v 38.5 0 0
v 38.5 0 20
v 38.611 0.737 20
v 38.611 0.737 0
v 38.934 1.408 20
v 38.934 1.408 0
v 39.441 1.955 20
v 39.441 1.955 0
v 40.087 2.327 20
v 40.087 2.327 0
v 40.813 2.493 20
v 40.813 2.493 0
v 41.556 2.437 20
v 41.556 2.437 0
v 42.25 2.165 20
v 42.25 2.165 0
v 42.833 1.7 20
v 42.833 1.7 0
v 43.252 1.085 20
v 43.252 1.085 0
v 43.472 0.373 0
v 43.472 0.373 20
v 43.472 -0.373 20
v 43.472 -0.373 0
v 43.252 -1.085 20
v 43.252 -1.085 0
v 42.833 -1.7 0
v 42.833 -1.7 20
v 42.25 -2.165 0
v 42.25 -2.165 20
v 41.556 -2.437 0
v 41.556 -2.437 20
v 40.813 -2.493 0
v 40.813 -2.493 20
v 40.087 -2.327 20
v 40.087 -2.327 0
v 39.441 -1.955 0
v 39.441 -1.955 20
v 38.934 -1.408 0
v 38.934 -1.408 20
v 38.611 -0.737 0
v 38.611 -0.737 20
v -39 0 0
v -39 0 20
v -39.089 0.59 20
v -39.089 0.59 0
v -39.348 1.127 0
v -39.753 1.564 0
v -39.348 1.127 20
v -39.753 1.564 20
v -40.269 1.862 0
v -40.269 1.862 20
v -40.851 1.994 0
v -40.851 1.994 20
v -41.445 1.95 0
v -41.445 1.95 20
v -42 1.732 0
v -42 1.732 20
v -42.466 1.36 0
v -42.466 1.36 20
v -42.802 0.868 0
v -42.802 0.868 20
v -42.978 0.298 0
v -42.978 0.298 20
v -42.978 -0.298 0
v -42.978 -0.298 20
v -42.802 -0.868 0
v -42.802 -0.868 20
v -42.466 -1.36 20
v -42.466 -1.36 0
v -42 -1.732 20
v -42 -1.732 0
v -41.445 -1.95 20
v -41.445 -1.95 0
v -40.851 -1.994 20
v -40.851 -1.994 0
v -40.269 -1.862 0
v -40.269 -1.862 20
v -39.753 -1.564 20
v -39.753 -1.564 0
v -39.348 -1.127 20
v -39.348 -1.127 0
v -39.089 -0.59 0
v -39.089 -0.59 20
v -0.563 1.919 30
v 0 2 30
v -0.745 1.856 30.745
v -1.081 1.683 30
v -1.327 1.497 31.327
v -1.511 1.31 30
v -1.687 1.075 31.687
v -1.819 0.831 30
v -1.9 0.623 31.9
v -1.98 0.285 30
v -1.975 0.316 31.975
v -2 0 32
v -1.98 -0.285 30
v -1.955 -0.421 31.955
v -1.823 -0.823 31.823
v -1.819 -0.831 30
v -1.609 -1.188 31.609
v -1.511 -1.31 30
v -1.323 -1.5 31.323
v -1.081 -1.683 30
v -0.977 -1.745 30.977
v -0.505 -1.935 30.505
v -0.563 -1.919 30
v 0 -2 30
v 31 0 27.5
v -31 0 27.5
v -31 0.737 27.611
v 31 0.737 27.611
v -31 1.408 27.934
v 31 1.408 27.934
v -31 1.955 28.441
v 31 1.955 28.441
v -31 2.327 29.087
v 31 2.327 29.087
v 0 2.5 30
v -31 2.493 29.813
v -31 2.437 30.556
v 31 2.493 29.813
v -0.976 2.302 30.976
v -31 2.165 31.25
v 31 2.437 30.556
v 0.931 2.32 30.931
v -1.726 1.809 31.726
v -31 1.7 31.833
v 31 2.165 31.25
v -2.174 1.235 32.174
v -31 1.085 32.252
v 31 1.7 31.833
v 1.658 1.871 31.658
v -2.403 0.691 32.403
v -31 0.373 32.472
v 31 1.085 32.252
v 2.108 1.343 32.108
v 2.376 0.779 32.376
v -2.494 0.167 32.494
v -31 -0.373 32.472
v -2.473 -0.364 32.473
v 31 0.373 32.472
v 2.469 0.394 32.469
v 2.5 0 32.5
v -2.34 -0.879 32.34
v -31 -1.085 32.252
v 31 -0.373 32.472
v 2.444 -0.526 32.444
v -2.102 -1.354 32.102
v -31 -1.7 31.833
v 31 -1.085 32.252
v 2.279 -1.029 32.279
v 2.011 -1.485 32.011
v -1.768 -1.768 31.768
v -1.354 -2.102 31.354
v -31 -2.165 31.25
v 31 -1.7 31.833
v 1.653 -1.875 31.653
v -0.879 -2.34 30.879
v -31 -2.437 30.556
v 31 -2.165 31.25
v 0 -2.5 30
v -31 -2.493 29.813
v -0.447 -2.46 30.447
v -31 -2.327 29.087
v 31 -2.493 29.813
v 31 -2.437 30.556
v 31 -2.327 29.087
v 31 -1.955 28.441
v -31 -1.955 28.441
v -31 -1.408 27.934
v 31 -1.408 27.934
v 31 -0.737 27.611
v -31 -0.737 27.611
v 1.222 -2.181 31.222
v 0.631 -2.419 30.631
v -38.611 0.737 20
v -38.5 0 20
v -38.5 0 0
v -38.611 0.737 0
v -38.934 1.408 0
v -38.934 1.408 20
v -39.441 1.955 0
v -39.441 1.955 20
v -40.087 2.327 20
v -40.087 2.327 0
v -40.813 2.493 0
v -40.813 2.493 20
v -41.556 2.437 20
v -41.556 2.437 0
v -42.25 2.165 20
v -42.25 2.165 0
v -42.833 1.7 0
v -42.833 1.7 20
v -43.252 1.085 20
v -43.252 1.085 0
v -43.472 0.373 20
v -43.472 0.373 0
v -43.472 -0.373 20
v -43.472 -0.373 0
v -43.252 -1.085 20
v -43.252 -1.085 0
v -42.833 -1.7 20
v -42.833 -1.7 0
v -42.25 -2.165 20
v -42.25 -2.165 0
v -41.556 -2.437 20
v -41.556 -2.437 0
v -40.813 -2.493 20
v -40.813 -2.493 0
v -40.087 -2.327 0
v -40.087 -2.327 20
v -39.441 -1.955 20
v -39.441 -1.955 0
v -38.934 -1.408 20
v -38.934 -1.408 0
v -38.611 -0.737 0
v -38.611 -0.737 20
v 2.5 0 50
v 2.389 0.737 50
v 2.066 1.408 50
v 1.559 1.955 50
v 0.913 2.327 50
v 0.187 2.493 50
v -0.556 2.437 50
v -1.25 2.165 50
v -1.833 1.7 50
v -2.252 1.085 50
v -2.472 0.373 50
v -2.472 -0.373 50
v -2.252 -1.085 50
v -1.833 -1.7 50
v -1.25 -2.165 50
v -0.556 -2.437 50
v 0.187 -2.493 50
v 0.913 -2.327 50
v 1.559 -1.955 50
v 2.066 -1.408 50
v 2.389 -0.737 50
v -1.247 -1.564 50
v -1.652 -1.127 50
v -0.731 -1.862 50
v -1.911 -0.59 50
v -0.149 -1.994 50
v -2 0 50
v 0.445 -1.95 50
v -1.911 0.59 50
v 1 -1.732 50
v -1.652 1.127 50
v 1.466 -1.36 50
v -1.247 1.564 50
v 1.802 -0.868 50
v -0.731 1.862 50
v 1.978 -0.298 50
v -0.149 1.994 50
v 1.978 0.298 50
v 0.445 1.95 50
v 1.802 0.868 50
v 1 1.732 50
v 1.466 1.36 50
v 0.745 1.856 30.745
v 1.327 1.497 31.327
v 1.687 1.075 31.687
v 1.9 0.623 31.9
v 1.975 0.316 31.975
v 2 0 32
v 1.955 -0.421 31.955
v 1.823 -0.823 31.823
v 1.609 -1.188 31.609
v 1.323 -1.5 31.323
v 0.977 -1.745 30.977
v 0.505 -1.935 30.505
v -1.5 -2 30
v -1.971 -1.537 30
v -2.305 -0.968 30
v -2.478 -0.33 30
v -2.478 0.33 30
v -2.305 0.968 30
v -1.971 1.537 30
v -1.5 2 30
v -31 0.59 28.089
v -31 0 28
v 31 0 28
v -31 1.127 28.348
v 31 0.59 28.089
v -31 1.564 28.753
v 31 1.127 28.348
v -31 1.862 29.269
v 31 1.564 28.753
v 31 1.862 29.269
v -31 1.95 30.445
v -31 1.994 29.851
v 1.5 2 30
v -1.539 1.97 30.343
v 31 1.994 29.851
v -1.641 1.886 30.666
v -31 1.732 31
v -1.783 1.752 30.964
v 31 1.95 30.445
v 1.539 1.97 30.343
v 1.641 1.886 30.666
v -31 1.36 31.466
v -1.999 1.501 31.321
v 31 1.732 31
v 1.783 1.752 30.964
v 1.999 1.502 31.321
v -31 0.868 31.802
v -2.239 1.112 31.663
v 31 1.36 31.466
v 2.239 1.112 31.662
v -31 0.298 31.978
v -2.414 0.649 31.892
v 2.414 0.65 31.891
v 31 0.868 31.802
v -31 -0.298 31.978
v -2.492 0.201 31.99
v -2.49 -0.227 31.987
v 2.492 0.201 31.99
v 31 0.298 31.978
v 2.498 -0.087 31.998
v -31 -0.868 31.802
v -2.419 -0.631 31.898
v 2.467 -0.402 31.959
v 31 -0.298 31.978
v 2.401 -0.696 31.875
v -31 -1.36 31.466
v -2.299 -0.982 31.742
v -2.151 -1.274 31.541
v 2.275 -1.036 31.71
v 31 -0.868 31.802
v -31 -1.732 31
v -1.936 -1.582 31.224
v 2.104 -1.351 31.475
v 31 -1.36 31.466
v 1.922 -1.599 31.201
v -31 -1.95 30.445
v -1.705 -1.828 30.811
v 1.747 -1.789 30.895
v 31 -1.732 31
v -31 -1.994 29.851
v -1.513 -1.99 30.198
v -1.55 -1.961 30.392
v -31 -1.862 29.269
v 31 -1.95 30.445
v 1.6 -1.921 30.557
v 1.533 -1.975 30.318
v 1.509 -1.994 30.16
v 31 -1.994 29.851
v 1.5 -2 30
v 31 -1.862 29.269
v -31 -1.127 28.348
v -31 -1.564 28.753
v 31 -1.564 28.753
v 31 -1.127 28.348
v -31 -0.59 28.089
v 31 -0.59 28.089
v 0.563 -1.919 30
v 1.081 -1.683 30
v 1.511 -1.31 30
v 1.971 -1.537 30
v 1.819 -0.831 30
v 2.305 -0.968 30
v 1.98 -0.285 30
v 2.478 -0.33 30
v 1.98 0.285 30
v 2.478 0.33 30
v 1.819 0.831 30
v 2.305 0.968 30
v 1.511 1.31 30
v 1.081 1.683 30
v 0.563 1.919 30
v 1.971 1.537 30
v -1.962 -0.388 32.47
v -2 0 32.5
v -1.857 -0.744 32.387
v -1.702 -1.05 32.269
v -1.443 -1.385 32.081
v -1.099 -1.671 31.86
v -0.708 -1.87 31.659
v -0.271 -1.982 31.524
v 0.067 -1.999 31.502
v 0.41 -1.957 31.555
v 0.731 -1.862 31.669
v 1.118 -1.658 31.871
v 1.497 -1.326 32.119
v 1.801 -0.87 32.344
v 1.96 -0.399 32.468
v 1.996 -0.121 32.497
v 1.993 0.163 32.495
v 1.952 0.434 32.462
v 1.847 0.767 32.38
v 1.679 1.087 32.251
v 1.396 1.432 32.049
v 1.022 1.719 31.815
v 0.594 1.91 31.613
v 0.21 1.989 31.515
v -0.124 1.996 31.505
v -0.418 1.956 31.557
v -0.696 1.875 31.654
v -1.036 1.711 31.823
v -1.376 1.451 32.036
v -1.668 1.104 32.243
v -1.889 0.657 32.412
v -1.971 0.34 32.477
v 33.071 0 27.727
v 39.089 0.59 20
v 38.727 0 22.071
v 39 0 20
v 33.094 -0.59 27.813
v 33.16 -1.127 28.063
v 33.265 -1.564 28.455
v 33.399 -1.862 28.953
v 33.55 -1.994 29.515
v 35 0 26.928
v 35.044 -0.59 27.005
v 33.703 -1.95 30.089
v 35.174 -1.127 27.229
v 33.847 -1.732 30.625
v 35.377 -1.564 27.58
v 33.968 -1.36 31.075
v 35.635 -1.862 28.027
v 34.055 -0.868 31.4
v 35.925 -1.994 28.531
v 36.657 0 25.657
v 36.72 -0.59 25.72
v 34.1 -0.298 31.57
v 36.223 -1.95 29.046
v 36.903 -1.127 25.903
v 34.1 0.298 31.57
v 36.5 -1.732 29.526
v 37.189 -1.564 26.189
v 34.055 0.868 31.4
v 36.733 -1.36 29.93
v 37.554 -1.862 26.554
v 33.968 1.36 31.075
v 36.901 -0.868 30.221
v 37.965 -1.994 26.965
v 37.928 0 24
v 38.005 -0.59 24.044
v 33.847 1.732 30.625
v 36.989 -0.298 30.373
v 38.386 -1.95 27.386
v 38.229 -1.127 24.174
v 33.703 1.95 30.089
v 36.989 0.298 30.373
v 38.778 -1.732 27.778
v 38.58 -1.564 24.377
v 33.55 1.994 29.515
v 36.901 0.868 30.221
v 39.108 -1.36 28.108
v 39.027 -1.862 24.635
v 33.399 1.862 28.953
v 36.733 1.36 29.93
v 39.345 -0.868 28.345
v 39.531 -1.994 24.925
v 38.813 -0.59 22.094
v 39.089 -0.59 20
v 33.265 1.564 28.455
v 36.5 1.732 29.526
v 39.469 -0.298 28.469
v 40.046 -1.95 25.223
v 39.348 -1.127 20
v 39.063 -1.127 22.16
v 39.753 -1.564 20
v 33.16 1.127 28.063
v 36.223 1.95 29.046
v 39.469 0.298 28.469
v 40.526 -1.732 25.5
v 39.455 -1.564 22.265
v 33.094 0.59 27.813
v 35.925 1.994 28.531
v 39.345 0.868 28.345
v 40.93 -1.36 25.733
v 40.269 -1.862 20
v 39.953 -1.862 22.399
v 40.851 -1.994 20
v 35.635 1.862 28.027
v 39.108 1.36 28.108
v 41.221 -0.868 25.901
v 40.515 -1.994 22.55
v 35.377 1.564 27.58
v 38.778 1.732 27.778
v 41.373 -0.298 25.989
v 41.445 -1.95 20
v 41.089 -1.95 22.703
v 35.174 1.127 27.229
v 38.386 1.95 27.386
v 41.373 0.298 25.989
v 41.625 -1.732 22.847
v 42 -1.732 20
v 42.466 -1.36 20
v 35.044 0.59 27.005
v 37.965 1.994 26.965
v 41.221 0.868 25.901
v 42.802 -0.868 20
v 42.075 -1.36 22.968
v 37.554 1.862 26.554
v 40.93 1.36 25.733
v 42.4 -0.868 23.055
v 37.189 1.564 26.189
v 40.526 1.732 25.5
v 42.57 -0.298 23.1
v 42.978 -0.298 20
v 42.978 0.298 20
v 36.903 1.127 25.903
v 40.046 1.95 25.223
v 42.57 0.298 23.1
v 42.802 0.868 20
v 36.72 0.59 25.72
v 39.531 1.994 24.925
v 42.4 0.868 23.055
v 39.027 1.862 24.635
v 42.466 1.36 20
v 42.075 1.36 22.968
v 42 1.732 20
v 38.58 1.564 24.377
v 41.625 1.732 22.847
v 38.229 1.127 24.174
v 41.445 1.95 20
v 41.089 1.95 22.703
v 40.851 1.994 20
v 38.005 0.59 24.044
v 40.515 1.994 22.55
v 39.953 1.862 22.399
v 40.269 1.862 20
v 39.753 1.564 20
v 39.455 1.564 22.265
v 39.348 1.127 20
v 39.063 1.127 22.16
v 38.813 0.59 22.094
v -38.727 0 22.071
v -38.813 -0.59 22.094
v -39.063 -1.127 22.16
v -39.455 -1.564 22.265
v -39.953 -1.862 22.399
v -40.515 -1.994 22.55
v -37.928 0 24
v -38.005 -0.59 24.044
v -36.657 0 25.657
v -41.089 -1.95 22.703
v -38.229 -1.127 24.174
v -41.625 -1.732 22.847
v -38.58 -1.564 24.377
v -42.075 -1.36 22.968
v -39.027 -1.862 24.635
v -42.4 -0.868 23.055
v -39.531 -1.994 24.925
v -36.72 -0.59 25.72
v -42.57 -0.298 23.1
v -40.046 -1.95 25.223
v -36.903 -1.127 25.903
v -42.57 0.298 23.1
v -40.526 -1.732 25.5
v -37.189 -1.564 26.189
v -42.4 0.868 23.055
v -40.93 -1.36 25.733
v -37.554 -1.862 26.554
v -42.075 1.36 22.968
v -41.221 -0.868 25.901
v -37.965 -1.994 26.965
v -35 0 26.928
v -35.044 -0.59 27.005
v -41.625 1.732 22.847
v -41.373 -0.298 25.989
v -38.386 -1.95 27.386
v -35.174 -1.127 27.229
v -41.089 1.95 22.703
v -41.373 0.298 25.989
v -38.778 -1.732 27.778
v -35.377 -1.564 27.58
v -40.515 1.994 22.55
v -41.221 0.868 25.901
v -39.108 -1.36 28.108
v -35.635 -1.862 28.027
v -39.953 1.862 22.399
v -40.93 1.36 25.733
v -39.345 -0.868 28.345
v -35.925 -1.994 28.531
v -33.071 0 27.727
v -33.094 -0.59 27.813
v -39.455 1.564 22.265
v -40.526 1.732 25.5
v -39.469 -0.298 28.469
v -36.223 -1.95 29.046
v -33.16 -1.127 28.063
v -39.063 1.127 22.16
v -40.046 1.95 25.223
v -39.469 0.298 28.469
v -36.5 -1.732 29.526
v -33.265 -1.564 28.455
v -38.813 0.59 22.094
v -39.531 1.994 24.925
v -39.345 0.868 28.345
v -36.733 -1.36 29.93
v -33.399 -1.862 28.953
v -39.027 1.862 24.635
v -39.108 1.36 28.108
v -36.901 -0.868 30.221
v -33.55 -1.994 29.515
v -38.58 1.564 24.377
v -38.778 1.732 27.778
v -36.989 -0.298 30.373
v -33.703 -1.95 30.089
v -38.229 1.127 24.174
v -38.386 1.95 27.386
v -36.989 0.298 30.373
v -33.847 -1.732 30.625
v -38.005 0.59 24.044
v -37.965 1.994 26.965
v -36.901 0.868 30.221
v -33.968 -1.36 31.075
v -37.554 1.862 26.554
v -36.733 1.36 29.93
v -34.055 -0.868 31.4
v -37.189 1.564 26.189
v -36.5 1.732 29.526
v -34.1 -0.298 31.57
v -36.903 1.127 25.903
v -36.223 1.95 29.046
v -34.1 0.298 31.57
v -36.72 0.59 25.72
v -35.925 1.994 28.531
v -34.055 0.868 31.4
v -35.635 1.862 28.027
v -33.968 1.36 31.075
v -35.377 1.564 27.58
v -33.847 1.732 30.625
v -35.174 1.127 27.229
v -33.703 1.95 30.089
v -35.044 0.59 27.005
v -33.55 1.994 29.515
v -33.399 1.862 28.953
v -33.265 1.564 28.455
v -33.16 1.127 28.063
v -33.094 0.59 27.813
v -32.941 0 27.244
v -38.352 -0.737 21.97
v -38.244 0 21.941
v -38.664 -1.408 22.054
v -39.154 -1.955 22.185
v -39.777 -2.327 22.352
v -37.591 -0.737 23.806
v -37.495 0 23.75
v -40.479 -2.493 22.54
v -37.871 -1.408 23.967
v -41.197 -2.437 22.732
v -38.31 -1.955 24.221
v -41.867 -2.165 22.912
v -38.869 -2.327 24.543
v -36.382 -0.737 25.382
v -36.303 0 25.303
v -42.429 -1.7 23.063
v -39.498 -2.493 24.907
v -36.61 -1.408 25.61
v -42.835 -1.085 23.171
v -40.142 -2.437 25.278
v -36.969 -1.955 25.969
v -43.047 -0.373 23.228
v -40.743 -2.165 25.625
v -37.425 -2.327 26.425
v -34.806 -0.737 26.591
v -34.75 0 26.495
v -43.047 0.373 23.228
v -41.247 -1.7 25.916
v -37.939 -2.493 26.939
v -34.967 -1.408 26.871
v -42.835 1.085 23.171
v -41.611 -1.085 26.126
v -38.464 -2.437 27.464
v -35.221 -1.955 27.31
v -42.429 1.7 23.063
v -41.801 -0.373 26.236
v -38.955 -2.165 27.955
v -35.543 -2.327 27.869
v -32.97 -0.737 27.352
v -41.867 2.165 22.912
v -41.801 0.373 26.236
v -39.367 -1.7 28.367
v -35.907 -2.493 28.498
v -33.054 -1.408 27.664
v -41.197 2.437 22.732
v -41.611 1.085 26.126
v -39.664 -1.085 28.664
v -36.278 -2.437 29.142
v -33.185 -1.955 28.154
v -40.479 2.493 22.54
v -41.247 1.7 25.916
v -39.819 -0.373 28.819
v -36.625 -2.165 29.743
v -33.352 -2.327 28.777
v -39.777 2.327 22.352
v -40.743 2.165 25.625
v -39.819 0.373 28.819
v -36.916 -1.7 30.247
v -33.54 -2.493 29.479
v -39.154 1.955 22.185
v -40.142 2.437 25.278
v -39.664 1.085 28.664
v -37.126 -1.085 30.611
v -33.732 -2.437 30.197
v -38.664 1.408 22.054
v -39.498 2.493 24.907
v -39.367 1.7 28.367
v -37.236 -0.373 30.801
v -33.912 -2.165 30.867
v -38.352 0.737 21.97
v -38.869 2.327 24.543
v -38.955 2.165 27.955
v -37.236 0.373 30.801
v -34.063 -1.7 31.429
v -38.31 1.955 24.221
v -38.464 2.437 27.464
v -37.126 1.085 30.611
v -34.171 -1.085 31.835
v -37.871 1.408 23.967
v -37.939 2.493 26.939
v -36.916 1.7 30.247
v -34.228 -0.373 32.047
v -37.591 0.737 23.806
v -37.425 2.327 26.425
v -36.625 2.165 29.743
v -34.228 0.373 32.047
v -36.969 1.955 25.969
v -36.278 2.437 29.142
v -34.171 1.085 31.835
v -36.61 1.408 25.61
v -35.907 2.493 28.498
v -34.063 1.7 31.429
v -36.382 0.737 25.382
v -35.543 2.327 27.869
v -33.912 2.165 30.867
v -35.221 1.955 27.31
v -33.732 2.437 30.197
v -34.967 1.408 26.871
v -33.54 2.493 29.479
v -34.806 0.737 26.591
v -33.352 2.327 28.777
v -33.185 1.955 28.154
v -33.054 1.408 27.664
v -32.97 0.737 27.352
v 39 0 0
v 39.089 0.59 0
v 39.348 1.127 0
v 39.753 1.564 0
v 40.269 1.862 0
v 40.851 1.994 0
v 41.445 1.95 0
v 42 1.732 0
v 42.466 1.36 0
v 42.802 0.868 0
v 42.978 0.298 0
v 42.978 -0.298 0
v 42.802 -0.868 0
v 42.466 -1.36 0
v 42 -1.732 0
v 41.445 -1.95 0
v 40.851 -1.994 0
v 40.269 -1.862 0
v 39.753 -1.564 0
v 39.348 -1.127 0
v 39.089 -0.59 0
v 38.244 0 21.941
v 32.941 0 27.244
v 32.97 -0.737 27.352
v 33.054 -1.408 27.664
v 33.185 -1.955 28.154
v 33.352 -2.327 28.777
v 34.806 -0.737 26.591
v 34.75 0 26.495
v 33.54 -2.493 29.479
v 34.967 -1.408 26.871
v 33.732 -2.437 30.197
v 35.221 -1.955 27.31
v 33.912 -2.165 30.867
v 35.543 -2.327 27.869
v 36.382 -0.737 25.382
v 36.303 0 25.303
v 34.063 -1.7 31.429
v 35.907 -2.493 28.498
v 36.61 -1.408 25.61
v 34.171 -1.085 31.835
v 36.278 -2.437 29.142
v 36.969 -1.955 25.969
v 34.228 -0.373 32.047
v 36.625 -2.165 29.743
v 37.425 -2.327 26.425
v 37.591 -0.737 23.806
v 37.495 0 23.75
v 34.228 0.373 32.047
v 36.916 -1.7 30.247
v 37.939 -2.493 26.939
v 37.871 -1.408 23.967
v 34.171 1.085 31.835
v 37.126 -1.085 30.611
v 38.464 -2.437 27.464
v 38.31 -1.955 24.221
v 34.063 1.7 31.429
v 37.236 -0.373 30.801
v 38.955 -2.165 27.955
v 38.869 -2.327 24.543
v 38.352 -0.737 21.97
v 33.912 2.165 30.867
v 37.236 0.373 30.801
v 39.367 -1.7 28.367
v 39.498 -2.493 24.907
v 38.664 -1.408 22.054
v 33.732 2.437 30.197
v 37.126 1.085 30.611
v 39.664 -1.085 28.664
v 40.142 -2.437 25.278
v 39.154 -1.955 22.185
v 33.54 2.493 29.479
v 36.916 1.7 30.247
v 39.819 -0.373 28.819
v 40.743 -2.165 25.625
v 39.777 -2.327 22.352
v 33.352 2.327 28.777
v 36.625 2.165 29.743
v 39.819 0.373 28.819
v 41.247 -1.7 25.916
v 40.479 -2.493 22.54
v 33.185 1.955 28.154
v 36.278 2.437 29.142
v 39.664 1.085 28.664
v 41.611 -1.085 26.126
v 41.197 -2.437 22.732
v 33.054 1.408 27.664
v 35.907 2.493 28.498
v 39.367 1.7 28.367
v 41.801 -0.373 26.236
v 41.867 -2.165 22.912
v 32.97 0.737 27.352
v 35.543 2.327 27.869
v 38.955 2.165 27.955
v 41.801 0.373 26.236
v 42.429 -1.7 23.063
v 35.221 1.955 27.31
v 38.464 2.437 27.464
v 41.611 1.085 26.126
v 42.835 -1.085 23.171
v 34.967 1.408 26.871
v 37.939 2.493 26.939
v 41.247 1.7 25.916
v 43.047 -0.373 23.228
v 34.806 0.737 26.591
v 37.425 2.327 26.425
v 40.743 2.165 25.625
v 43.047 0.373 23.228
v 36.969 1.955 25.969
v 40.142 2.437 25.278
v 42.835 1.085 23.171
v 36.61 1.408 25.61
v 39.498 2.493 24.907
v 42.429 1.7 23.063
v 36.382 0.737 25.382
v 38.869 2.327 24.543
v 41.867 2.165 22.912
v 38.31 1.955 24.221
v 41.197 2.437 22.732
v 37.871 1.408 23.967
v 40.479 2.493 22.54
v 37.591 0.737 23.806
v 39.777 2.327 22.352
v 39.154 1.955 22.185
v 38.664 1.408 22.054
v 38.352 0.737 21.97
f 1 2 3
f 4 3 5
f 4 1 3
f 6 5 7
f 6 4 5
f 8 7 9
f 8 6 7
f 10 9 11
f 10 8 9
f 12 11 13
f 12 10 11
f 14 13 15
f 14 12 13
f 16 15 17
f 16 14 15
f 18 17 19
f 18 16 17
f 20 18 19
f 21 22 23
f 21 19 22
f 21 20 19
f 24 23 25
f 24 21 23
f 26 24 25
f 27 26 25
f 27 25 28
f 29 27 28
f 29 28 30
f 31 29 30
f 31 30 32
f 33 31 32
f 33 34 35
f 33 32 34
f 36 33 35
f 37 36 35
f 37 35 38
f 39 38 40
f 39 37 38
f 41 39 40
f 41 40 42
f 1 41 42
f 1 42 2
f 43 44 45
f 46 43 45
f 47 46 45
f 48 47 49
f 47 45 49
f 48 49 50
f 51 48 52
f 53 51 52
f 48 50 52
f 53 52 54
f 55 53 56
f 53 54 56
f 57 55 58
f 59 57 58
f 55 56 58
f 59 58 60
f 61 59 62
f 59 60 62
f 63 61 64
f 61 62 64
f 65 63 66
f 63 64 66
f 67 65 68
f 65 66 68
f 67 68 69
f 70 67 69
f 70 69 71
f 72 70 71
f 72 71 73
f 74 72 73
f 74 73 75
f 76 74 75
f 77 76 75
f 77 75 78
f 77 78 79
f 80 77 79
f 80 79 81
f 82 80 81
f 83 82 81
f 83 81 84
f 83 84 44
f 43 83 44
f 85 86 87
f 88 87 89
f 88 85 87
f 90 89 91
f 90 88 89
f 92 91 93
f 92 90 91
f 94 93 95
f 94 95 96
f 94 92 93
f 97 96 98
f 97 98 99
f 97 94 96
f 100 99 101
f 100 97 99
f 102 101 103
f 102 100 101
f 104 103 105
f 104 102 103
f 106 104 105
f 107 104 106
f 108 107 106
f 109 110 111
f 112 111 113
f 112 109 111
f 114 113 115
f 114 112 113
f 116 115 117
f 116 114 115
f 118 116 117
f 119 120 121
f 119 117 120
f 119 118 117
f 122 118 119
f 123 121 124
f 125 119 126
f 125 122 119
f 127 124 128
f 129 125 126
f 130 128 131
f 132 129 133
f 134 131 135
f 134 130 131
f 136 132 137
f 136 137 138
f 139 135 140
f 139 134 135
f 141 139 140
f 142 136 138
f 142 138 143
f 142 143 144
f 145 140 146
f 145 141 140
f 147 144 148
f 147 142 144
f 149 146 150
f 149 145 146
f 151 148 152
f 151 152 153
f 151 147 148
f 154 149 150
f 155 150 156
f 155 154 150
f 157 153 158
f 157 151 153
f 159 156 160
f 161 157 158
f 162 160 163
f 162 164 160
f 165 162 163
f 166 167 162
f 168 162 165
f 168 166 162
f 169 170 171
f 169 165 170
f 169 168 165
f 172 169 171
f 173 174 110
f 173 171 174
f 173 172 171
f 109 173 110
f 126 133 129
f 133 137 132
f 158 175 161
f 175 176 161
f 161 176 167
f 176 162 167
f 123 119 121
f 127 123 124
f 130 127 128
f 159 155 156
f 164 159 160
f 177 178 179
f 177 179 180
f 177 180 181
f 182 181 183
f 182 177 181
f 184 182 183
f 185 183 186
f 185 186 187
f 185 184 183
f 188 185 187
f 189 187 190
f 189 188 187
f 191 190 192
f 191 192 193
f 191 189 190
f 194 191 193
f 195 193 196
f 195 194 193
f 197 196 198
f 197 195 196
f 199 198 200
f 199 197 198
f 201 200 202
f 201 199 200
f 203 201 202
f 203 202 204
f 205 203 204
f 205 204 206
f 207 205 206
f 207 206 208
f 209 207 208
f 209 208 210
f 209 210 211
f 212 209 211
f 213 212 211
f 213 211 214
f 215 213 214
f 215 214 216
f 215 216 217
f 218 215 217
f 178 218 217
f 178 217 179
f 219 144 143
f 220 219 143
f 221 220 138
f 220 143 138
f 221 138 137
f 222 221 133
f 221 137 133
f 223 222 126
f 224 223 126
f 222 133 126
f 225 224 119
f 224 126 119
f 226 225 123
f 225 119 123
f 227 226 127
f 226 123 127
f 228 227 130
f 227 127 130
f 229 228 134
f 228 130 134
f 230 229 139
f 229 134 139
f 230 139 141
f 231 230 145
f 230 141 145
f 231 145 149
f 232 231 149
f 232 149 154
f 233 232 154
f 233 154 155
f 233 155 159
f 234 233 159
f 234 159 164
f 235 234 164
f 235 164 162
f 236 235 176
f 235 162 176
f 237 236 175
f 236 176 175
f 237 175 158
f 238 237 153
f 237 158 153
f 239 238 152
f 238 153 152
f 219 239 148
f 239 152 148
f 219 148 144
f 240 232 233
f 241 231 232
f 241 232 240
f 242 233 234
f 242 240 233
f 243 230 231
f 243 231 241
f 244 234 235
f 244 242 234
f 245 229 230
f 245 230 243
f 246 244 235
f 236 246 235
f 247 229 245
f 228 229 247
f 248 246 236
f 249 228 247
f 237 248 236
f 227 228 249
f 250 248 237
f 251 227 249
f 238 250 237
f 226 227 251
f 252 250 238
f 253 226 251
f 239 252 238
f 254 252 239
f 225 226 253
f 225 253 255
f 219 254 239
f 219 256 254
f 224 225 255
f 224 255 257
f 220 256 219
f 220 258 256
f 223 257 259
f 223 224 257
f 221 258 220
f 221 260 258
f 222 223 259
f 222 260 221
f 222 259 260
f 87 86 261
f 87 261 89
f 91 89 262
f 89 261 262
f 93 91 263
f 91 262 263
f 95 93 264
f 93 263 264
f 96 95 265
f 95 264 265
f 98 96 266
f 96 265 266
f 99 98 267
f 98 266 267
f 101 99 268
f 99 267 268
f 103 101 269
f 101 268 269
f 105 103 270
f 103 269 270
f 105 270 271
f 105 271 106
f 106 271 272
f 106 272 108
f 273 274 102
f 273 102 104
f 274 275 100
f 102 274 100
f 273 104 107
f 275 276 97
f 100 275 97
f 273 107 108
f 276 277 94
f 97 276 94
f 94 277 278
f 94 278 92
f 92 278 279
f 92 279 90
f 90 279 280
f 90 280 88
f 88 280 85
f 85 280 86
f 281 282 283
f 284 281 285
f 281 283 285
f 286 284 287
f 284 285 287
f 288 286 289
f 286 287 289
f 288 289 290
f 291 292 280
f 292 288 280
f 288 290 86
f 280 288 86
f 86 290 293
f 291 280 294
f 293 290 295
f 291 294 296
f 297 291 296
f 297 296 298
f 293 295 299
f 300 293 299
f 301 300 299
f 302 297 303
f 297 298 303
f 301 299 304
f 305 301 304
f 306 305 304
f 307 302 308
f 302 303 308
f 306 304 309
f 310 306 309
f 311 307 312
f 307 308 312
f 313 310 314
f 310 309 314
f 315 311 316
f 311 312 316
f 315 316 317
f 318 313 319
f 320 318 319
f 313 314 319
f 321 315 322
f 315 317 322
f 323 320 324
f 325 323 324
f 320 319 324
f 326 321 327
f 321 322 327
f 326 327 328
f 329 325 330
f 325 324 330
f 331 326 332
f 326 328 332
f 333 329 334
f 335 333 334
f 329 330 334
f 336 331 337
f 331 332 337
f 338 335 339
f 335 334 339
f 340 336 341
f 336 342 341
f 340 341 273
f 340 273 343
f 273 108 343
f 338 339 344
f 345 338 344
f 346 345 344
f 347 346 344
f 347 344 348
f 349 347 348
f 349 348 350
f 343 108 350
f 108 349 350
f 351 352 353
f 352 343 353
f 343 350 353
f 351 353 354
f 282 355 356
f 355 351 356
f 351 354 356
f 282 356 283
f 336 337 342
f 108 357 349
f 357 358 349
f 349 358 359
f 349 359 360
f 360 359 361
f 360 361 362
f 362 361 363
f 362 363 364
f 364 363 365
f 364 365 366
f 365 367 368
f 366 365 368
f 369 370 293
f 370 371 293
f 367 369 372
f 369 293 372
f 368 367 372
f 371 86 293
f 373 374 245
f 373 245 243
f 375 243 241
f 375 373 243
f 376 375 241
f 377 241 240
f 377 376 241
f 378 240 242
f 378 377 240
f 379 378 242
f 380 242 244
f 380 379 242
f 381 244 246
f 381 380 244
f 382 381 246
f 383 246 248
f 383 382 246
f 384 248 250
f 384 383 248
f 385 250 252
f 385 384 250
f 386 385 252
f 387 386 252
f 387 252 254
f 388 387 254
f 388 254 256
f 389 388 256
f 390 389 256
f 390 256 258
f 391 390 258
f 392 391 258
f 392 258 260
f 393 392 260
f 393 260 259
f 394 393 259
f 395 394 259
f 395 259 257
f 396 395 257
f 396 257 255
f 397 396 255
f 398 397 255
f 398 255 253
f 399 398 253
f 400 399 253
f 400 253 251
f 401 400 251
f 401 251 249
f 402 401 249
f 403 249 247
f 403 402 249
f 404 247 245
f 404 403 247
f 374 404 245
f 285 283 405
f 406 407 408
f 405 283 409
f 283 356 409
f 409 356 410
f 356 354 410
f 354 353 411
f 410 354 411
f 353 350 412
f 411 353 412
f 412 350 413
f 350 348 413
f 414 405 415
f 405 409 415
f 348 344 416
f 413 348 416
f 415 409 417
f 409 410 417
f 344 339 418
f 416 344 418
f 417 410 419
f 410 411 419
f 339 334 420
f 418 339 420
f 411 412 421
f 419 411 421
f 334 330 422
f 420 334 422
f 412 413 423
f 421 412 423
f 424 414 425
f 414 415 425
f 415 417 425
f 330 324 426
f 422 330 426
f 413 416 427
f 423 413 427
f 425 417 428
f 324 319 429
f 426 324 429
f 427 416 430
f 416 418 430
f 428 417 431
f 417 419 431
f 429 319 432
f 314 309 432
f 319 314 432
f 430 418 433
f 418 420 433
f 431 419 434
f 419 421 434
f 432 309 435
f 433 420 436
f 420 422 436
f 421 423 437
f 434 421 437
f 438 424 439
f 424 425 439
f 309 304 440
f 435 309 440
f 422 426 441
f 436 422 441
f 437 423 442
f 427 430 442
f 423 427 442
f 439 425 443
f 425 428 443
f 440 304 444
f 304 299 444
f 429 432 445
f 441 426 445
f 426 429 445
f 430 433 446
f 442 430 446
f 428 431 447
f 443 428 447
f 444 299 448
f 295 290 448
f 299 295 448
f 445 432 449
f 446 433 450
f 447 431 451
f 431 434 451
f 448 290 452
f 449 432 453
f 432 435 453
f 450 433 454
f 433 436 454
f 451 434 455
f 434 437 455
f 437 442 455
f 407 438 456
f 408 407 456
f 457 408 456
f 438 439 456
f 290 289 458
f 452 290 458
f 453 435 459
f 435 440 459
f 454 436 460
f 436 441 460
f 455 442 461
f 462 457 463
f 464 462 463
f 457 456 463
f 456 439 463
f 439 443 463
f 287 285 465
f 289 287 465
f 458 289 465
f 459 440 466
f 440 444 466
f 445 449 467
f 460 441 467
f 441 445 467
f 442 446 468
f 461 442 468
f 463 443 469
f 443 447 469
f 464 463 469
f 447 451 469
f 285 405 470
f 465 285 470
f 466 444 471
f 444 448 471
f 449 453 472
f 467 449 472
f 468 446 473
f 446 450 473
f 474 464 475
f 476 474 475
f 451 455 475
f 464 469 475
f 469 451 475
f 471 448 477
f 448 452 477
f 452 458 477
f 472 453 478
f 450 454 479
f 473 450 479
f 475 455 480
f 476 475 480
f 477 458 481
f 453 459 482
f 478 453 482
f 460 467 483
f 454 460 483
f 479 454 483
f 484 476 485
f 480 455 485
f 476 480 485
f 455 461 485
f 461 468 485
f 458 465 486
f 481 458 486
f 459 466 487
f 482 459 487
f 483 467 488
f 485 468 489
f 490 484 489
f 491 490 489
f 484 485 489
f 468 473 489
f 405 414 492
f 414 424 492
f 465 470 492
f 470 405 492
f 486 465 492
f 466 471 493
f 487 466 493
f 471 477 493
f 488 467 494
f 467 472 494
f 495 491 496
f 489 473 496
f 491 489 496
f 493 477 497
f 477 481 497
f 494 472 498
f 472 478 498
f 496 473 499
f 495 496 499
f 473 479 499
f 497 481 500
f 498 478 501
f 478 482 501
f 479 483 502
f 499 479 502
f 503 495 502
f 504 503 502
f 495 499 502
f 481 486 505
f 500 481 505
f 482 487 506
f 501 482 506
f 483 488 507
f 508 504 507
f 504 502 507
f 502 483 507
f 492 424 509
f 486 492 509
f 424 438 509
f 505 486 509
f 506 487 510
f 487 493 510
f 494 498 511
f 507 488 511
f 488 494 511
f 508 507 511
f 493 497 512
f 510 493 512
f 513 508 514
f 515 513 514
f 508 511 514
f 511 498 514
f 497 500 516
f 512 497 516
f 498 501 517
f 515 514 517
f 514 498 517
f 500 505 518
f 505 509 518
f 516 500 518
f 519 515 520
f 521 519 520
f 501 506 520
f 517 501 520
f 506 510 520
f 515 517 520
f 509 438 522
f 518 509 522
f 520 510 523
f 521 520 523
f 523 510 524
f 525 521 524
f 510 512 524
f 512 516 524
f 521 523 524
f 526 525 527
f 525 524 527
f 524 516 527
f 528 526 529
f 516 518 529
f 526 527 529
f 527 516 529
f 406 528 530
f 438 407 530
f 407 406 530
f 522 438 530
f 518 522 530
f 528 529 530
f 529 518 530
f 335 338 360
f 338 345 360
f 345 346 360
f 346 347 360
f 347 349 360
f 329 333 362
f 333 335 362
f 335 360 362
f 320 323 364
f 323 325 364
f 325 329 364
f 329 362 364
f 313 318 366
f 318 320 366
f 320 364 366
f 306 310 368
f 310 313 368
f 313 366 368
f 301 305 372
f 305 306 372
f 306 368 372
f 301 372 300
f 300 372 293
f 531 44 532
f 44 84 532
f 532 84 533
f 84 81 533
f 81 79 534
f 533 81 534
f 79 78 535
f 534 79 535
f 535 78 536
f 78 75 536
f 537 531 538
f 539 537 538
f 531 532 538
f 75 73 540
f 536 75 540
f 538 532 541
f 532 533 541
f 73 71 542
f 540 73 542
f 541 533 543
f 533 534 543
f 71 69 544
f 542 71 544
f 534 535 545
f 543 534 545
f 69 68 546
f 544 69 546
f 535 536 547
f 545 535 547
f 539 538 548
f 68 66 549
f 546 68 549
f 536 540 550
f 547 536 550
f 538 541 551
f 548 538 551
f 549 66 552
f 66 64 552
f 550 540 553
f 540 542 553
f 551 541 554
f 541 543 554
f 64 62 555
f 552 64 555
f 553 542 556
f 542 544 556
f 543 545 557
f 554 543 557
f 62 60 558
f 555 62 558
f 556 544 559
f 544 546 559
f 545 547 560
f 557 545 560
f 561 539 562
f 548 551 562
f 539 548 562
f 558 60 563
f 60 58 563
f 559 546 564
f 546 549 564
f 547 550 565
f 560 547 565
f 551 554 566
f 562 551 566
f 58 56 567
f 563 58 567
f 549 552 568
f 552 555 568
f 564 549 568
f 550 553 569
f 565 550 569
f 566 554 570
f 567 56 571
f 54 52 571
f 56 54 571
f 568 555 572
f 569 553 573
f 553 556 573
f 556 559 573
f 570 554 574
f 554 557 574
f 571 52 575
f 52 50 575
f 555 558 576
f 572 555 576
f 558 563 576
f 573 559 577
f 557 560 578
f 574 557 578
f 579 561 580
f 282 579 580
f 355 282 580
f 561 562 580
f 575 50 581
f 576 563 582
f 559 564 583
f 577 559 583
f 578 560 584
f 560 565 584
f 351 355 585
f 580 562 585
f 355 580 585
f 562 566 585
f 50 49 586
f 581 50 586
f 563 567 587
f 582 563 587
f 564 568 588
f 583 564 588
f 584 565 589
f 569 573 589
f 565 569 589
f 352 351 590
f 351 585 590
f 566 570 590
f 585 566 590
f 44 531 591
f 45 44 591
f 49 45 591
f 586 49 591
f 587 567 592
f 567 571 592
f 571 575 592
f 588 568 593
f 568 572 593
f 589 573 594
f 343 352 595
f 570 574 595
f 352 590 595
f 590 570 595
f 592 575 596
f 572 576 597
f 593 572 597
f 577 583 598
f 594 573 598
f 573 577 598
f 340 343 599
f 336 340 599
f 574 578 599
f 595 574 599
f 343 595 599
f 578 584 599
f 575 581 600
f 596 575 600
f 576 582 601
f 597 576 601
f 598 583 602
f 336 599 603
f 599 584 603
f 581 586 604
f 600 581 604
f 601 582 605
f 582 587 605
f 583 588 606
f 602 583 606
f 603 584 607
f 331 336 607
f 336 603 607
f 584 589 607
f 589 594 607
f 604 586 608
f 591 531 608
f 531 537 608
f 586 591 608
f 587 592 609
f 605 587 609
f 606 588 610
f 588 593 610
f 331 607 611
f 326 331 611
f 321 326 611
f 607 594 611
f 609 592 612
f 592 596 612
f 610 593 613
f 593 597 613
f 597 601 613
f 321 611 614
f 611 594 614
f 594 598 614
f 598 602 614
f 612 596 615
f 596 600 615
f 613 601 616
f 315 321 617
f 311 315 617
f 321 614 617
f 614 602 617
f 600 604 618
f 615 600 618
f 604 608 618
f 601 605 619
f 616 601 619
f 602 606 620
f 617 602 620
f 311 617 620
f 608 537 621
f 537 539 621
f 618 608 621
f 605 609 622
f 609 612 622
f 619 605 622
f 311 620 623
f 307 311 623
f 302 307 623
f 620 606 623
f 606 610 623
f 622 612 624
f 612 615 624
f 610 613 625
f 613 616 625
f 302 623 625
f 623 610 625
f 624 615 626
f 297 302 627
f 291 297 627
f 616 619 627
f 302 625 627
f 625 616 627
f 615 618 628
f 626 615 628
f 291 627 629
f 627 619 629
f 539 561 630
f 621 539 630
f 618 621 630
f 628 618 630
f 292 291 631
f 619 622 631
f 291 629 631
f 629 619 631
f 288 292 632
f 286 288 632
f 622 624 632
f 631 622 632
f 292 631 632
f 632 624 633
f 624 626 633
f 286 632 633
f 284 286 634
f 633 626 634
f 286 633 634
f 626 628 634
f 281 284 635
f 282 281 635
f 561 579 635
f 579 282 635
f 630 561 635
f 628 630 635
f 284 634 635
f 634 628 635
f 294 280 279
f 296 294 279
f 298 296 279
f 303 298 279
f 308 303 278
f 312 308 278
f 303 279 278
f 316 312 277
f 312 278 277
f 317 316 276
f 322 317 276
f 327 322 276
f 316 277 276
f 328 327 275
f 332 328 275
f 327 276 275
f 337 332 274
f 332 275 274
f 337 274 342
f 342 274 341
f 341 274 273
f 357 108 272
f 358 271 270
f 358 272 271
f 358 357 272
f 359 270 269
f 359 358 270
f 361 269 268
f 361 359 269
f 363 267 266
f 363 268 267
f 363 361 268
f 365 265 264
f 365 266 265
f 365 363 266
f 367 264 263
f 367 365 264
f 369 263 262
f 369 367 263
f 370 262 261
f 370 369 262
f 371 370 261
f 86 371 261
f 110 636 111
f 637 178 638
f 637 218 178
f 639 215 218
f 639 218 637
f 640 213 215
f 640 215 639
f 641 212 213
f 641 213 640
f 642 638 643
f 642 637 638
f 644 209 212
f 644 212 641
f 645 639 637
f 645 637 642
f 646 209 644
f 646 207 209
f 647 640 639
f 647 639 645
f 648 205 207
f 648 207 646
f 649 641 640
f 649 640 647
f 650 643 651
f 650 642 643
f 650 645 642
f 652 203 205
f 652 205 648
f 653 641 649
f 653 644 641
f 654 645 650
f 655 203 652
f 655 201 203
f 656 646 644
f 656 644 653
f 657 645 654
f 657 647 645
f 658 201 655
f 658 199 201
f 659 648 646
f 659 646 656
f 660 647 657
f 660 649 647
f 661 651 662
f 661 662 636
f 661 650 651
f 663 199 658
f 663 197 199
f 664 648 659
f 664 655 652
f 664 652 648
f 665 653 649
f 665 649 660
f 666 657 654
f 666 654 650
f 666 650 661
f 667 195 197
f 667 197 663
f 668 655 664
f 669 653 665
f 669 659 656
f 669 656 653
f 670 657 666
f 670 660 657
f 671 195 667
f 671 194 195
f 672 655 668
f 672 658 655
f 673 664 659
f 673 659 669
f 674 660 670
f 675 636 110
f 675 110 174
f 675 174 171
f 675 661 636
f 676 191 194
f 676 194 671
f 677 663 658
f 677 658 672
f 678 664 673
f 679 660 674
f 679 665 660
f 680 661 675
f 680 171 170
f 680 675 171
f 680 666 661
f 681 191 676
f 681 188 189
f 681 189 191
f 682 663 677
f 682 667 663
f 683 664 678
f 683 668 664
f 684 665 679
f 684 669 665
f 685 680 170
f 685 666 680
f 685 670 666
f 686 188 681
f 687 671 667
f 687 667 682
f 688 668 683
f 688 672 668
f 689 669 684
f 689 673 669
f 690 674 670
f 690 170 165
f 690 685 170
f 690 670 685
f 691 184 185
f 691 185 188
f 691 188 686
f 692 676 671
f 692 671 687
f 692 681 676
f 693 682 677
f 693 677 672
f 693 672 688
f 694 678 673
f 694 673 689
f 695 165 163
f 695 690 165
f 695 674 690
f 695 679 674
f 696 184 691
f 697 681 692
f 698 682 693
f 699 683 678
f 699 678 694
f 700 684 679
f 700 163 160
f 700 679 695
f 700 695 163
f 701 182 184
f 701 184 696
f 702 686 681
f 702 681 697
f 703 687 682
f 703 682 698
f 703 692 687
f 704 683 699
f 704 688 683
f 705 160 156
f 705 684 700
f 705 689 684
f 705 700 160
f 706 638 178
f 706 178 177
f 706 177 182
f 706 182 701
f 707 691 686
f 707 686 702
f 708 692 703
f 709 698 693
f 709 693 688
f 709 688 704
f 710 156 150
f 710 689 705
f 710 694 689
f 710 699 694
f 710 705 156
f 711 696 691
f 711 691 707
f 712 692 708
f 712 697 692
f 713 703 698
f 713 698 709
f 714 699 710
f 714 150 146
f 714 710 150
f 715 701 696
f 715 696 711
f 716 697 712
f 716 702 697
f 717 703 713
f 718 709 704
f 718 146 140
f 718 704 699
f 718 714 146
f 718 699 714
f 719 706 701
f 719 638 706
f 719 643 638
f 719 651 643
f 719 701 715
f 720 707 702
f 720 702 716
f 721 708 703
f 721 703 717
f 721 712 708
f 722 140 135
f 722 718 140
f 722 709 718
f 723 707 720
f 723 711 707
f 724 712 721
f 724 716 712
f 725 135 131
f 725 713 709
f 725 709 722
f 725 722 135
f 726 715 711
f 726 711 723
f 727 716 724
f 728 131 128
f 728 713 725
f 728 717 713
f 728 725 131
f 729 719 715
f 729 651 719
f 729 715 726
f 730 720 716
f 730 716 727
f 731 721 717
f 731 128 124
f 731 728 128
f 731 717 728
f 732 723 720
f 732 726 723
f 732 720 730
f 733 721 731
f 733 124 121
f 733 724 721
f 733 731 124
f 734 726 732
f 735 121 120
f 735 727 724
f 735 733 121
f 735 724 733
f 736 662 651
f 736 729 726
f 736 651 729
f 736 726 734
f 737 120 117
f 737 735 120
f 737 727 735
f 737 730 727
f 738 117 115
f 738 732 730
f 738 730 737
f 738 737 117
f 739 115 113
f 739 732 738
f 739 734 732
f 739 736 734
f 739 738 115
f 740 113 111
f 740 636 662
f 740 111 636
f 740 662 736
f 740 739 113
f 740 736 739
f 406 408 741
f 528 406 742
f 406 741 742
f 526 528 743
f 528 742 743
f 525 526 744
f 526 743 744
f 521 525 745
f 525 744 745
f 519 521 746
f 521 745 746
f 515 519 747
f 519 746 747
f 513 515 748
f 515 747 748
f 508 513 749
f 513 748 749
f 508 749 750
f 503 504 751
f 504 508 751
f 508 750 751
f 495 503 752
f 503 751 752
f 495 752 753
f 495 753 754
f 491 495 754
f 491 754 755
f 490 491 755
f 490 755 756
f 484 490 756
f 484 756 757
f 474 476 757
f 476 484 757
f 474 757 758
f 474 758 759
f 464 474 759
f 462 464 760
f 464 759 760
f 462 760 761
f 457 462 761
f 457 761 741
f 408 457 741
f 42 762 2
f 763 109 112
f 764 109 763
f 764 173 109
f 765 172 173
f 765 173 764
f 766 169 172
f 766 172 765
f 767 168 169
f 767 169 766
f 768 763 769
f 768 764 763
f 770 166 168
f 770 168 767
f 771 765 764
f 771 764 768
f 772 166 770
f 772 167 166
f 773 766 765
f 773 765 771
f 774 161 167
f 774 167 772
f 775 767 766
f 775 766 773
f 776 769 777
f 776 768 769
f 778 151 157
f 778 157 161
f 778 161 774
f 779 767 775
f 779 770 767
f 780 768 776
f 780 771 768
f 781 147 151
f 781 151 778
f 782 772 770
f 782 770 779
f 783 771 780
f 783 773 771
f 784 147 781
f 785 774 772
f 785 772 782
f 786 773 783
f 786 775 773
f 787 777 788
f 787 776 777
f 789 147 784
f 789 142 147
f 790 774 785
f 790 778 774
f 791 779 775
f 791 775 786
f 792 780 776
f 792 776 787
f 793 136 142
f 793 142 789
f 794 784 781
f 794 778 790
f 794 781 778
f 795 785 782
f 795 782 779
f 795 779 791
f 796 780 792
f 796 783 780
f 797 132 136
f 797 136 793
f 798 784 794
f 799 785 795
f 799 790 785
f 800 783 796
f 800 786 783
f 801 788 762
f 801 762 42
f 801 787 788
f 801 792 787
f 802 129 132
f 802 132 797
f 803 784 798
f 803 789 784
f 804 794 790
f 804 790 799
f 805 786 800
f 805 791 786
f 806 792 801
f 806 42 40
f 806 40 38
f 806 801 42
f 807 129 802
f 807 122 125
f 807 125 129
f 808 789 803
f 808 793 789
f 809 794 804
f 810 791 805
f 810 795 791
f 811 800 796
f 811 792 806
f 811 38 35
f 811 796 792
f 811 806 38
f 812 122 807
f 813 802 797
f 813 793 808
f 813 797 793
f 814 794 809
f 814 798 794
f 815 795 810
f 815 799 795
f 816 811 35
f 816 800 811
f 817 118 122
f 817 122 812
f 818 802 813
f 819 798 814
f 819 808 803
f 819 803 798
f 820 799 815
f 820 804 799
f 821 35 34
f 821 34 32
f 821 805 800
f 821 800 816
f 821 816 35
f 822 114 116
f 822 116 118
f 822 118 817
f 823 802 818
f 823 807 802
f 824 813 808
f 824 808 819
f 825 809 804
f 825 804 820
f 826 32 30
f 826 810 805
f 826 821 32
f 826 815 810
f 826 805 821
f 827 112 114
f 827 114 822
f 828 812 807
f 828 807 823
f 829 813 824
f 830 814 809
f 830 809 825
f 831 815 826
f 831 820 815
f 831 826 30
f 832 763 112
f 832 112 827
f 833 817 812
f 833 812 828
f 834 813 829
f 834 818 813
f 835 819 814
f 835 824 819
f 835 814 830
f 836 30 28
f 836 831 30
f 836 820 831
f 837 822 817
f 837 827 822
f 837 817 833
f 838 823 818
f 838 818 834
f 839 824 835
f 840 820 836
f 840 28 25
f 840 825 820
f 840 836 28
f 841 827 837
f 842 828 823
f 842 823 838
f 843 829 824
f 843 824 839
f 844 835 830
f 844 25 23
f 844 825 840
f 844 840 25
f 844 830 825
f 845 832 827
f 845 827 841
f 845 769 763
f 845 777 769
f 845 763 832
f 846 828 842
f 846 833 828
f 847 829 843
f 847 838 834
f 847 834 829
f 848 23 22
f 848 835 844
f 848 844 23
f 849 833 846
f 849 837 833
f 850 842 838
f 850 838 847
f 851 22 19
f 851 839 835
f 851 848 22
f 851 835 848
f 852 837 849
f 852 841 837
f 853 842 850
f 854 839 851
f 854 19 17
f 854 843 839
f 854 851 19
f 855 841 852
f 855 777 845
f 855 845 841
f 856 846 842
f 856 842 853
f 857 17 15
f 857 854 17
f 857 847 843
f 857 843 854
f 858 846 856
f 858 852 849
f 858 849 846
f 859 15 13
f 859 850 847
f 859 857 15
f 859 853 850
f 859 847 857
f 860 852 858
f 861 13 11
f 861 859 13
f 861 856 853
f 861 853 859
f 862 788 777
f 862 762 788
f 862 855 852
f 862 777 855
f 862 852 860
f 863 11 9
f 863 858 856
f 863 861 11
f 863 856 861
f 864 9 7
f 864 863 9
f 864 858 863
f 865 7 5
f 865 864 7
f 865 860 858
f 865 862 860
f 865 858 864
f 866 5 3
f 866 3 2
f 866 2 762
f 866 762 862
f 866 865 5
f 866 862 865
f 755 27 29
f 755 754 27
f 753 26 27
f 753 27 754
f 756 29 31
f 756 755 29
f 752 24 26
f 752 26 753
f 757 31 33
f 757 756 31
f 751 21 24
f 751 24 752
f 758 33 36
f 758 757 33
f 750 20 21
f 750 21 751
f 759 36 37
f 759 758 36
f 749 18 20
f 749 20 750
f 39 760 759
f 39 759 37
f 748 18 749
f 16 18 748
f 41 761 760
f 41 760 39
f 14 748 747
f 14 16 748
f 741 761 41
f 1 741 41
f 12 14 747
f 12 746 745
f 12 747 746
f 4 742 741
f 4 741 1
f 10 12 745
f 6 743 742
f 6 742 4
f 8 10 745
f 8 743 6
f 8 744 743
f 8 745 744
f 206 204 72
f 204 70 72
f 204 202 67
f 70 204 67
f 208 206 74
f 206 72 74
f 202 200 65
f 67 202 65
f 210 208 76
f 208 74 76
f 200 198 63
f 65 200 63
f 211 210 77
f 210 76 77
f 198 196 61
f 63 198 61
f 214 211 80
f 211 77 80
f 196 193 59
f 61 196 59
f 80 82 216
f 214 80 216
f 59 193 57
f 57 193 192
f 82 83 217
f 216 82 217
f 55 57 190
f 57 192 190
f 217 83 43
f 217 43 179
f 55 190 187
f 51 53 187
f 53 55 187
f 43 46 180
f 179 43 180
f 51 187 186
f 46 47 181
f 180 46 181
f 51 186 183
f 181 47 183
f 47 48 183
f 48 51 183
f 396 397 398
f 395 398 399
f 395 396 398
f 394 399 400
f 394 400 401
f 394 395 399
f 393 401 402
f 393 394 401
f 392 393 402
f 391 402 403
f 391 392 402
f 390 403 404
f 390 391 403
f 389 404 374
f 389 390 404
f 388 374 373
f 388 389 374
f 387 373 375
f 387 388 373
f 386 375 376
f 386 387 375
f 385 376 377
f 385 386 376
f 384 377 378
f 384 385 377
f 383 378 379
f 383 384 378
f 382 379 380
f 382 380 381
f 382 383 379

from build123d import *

# Parameters (mm, degrees)
SKETCH3_R           = 2.5
SKETCH3_R_2         = 2
SKETCH5_R           = 2.5
SKETCH5_R_2         = 2
BOSS_EXTRUDE2_DEPTH = 20


with BuildPart() as part:
    # Sweep1: sweep along a path in Sketch2
    with BuildLine(Plane(origin=(0, 0, 0), x_dir=(1, 0, 0), z_dir=(0, 1, 0))) as sweep1_path:
        Line((-41, 0), (-41, -20))
        ThreePointArc((-41, -20), (-38.071067812, -27.071067812), (-31, -30))
        Line((-31, -30), (31, -30))
        ThreePointArc((31, -30), (38.071067812, -27.071067812), (41, -20))
        Line((41, -20), (41, 0))
    # Sketch3 → Sweep1 (sweep)
    with BuildSketch(Plane.XY):
        with Locations((-41, 0)):
            Circle(SKETCH3_R)
        with Locations((-41, 0)):
            Circle(SKETCH3_R_2, mode=Mode.SUBTRACT)
    sweep(path=sweep1_path.line)

    # Sketch5 → Boss-Extrude2 (add)
    with BuildSketch(Plane.XY.offset(30)):
        Circle(SKETCH5_R)
        with Locations(Location((0, 0, 0), (0, 0, 180))):
            Circle(SKETCH5_R_2, mode=Mode.SUBTRACT)
    extrude(amount=BOSS_EXTRUDE2_DEPTH)


solid = part.part
